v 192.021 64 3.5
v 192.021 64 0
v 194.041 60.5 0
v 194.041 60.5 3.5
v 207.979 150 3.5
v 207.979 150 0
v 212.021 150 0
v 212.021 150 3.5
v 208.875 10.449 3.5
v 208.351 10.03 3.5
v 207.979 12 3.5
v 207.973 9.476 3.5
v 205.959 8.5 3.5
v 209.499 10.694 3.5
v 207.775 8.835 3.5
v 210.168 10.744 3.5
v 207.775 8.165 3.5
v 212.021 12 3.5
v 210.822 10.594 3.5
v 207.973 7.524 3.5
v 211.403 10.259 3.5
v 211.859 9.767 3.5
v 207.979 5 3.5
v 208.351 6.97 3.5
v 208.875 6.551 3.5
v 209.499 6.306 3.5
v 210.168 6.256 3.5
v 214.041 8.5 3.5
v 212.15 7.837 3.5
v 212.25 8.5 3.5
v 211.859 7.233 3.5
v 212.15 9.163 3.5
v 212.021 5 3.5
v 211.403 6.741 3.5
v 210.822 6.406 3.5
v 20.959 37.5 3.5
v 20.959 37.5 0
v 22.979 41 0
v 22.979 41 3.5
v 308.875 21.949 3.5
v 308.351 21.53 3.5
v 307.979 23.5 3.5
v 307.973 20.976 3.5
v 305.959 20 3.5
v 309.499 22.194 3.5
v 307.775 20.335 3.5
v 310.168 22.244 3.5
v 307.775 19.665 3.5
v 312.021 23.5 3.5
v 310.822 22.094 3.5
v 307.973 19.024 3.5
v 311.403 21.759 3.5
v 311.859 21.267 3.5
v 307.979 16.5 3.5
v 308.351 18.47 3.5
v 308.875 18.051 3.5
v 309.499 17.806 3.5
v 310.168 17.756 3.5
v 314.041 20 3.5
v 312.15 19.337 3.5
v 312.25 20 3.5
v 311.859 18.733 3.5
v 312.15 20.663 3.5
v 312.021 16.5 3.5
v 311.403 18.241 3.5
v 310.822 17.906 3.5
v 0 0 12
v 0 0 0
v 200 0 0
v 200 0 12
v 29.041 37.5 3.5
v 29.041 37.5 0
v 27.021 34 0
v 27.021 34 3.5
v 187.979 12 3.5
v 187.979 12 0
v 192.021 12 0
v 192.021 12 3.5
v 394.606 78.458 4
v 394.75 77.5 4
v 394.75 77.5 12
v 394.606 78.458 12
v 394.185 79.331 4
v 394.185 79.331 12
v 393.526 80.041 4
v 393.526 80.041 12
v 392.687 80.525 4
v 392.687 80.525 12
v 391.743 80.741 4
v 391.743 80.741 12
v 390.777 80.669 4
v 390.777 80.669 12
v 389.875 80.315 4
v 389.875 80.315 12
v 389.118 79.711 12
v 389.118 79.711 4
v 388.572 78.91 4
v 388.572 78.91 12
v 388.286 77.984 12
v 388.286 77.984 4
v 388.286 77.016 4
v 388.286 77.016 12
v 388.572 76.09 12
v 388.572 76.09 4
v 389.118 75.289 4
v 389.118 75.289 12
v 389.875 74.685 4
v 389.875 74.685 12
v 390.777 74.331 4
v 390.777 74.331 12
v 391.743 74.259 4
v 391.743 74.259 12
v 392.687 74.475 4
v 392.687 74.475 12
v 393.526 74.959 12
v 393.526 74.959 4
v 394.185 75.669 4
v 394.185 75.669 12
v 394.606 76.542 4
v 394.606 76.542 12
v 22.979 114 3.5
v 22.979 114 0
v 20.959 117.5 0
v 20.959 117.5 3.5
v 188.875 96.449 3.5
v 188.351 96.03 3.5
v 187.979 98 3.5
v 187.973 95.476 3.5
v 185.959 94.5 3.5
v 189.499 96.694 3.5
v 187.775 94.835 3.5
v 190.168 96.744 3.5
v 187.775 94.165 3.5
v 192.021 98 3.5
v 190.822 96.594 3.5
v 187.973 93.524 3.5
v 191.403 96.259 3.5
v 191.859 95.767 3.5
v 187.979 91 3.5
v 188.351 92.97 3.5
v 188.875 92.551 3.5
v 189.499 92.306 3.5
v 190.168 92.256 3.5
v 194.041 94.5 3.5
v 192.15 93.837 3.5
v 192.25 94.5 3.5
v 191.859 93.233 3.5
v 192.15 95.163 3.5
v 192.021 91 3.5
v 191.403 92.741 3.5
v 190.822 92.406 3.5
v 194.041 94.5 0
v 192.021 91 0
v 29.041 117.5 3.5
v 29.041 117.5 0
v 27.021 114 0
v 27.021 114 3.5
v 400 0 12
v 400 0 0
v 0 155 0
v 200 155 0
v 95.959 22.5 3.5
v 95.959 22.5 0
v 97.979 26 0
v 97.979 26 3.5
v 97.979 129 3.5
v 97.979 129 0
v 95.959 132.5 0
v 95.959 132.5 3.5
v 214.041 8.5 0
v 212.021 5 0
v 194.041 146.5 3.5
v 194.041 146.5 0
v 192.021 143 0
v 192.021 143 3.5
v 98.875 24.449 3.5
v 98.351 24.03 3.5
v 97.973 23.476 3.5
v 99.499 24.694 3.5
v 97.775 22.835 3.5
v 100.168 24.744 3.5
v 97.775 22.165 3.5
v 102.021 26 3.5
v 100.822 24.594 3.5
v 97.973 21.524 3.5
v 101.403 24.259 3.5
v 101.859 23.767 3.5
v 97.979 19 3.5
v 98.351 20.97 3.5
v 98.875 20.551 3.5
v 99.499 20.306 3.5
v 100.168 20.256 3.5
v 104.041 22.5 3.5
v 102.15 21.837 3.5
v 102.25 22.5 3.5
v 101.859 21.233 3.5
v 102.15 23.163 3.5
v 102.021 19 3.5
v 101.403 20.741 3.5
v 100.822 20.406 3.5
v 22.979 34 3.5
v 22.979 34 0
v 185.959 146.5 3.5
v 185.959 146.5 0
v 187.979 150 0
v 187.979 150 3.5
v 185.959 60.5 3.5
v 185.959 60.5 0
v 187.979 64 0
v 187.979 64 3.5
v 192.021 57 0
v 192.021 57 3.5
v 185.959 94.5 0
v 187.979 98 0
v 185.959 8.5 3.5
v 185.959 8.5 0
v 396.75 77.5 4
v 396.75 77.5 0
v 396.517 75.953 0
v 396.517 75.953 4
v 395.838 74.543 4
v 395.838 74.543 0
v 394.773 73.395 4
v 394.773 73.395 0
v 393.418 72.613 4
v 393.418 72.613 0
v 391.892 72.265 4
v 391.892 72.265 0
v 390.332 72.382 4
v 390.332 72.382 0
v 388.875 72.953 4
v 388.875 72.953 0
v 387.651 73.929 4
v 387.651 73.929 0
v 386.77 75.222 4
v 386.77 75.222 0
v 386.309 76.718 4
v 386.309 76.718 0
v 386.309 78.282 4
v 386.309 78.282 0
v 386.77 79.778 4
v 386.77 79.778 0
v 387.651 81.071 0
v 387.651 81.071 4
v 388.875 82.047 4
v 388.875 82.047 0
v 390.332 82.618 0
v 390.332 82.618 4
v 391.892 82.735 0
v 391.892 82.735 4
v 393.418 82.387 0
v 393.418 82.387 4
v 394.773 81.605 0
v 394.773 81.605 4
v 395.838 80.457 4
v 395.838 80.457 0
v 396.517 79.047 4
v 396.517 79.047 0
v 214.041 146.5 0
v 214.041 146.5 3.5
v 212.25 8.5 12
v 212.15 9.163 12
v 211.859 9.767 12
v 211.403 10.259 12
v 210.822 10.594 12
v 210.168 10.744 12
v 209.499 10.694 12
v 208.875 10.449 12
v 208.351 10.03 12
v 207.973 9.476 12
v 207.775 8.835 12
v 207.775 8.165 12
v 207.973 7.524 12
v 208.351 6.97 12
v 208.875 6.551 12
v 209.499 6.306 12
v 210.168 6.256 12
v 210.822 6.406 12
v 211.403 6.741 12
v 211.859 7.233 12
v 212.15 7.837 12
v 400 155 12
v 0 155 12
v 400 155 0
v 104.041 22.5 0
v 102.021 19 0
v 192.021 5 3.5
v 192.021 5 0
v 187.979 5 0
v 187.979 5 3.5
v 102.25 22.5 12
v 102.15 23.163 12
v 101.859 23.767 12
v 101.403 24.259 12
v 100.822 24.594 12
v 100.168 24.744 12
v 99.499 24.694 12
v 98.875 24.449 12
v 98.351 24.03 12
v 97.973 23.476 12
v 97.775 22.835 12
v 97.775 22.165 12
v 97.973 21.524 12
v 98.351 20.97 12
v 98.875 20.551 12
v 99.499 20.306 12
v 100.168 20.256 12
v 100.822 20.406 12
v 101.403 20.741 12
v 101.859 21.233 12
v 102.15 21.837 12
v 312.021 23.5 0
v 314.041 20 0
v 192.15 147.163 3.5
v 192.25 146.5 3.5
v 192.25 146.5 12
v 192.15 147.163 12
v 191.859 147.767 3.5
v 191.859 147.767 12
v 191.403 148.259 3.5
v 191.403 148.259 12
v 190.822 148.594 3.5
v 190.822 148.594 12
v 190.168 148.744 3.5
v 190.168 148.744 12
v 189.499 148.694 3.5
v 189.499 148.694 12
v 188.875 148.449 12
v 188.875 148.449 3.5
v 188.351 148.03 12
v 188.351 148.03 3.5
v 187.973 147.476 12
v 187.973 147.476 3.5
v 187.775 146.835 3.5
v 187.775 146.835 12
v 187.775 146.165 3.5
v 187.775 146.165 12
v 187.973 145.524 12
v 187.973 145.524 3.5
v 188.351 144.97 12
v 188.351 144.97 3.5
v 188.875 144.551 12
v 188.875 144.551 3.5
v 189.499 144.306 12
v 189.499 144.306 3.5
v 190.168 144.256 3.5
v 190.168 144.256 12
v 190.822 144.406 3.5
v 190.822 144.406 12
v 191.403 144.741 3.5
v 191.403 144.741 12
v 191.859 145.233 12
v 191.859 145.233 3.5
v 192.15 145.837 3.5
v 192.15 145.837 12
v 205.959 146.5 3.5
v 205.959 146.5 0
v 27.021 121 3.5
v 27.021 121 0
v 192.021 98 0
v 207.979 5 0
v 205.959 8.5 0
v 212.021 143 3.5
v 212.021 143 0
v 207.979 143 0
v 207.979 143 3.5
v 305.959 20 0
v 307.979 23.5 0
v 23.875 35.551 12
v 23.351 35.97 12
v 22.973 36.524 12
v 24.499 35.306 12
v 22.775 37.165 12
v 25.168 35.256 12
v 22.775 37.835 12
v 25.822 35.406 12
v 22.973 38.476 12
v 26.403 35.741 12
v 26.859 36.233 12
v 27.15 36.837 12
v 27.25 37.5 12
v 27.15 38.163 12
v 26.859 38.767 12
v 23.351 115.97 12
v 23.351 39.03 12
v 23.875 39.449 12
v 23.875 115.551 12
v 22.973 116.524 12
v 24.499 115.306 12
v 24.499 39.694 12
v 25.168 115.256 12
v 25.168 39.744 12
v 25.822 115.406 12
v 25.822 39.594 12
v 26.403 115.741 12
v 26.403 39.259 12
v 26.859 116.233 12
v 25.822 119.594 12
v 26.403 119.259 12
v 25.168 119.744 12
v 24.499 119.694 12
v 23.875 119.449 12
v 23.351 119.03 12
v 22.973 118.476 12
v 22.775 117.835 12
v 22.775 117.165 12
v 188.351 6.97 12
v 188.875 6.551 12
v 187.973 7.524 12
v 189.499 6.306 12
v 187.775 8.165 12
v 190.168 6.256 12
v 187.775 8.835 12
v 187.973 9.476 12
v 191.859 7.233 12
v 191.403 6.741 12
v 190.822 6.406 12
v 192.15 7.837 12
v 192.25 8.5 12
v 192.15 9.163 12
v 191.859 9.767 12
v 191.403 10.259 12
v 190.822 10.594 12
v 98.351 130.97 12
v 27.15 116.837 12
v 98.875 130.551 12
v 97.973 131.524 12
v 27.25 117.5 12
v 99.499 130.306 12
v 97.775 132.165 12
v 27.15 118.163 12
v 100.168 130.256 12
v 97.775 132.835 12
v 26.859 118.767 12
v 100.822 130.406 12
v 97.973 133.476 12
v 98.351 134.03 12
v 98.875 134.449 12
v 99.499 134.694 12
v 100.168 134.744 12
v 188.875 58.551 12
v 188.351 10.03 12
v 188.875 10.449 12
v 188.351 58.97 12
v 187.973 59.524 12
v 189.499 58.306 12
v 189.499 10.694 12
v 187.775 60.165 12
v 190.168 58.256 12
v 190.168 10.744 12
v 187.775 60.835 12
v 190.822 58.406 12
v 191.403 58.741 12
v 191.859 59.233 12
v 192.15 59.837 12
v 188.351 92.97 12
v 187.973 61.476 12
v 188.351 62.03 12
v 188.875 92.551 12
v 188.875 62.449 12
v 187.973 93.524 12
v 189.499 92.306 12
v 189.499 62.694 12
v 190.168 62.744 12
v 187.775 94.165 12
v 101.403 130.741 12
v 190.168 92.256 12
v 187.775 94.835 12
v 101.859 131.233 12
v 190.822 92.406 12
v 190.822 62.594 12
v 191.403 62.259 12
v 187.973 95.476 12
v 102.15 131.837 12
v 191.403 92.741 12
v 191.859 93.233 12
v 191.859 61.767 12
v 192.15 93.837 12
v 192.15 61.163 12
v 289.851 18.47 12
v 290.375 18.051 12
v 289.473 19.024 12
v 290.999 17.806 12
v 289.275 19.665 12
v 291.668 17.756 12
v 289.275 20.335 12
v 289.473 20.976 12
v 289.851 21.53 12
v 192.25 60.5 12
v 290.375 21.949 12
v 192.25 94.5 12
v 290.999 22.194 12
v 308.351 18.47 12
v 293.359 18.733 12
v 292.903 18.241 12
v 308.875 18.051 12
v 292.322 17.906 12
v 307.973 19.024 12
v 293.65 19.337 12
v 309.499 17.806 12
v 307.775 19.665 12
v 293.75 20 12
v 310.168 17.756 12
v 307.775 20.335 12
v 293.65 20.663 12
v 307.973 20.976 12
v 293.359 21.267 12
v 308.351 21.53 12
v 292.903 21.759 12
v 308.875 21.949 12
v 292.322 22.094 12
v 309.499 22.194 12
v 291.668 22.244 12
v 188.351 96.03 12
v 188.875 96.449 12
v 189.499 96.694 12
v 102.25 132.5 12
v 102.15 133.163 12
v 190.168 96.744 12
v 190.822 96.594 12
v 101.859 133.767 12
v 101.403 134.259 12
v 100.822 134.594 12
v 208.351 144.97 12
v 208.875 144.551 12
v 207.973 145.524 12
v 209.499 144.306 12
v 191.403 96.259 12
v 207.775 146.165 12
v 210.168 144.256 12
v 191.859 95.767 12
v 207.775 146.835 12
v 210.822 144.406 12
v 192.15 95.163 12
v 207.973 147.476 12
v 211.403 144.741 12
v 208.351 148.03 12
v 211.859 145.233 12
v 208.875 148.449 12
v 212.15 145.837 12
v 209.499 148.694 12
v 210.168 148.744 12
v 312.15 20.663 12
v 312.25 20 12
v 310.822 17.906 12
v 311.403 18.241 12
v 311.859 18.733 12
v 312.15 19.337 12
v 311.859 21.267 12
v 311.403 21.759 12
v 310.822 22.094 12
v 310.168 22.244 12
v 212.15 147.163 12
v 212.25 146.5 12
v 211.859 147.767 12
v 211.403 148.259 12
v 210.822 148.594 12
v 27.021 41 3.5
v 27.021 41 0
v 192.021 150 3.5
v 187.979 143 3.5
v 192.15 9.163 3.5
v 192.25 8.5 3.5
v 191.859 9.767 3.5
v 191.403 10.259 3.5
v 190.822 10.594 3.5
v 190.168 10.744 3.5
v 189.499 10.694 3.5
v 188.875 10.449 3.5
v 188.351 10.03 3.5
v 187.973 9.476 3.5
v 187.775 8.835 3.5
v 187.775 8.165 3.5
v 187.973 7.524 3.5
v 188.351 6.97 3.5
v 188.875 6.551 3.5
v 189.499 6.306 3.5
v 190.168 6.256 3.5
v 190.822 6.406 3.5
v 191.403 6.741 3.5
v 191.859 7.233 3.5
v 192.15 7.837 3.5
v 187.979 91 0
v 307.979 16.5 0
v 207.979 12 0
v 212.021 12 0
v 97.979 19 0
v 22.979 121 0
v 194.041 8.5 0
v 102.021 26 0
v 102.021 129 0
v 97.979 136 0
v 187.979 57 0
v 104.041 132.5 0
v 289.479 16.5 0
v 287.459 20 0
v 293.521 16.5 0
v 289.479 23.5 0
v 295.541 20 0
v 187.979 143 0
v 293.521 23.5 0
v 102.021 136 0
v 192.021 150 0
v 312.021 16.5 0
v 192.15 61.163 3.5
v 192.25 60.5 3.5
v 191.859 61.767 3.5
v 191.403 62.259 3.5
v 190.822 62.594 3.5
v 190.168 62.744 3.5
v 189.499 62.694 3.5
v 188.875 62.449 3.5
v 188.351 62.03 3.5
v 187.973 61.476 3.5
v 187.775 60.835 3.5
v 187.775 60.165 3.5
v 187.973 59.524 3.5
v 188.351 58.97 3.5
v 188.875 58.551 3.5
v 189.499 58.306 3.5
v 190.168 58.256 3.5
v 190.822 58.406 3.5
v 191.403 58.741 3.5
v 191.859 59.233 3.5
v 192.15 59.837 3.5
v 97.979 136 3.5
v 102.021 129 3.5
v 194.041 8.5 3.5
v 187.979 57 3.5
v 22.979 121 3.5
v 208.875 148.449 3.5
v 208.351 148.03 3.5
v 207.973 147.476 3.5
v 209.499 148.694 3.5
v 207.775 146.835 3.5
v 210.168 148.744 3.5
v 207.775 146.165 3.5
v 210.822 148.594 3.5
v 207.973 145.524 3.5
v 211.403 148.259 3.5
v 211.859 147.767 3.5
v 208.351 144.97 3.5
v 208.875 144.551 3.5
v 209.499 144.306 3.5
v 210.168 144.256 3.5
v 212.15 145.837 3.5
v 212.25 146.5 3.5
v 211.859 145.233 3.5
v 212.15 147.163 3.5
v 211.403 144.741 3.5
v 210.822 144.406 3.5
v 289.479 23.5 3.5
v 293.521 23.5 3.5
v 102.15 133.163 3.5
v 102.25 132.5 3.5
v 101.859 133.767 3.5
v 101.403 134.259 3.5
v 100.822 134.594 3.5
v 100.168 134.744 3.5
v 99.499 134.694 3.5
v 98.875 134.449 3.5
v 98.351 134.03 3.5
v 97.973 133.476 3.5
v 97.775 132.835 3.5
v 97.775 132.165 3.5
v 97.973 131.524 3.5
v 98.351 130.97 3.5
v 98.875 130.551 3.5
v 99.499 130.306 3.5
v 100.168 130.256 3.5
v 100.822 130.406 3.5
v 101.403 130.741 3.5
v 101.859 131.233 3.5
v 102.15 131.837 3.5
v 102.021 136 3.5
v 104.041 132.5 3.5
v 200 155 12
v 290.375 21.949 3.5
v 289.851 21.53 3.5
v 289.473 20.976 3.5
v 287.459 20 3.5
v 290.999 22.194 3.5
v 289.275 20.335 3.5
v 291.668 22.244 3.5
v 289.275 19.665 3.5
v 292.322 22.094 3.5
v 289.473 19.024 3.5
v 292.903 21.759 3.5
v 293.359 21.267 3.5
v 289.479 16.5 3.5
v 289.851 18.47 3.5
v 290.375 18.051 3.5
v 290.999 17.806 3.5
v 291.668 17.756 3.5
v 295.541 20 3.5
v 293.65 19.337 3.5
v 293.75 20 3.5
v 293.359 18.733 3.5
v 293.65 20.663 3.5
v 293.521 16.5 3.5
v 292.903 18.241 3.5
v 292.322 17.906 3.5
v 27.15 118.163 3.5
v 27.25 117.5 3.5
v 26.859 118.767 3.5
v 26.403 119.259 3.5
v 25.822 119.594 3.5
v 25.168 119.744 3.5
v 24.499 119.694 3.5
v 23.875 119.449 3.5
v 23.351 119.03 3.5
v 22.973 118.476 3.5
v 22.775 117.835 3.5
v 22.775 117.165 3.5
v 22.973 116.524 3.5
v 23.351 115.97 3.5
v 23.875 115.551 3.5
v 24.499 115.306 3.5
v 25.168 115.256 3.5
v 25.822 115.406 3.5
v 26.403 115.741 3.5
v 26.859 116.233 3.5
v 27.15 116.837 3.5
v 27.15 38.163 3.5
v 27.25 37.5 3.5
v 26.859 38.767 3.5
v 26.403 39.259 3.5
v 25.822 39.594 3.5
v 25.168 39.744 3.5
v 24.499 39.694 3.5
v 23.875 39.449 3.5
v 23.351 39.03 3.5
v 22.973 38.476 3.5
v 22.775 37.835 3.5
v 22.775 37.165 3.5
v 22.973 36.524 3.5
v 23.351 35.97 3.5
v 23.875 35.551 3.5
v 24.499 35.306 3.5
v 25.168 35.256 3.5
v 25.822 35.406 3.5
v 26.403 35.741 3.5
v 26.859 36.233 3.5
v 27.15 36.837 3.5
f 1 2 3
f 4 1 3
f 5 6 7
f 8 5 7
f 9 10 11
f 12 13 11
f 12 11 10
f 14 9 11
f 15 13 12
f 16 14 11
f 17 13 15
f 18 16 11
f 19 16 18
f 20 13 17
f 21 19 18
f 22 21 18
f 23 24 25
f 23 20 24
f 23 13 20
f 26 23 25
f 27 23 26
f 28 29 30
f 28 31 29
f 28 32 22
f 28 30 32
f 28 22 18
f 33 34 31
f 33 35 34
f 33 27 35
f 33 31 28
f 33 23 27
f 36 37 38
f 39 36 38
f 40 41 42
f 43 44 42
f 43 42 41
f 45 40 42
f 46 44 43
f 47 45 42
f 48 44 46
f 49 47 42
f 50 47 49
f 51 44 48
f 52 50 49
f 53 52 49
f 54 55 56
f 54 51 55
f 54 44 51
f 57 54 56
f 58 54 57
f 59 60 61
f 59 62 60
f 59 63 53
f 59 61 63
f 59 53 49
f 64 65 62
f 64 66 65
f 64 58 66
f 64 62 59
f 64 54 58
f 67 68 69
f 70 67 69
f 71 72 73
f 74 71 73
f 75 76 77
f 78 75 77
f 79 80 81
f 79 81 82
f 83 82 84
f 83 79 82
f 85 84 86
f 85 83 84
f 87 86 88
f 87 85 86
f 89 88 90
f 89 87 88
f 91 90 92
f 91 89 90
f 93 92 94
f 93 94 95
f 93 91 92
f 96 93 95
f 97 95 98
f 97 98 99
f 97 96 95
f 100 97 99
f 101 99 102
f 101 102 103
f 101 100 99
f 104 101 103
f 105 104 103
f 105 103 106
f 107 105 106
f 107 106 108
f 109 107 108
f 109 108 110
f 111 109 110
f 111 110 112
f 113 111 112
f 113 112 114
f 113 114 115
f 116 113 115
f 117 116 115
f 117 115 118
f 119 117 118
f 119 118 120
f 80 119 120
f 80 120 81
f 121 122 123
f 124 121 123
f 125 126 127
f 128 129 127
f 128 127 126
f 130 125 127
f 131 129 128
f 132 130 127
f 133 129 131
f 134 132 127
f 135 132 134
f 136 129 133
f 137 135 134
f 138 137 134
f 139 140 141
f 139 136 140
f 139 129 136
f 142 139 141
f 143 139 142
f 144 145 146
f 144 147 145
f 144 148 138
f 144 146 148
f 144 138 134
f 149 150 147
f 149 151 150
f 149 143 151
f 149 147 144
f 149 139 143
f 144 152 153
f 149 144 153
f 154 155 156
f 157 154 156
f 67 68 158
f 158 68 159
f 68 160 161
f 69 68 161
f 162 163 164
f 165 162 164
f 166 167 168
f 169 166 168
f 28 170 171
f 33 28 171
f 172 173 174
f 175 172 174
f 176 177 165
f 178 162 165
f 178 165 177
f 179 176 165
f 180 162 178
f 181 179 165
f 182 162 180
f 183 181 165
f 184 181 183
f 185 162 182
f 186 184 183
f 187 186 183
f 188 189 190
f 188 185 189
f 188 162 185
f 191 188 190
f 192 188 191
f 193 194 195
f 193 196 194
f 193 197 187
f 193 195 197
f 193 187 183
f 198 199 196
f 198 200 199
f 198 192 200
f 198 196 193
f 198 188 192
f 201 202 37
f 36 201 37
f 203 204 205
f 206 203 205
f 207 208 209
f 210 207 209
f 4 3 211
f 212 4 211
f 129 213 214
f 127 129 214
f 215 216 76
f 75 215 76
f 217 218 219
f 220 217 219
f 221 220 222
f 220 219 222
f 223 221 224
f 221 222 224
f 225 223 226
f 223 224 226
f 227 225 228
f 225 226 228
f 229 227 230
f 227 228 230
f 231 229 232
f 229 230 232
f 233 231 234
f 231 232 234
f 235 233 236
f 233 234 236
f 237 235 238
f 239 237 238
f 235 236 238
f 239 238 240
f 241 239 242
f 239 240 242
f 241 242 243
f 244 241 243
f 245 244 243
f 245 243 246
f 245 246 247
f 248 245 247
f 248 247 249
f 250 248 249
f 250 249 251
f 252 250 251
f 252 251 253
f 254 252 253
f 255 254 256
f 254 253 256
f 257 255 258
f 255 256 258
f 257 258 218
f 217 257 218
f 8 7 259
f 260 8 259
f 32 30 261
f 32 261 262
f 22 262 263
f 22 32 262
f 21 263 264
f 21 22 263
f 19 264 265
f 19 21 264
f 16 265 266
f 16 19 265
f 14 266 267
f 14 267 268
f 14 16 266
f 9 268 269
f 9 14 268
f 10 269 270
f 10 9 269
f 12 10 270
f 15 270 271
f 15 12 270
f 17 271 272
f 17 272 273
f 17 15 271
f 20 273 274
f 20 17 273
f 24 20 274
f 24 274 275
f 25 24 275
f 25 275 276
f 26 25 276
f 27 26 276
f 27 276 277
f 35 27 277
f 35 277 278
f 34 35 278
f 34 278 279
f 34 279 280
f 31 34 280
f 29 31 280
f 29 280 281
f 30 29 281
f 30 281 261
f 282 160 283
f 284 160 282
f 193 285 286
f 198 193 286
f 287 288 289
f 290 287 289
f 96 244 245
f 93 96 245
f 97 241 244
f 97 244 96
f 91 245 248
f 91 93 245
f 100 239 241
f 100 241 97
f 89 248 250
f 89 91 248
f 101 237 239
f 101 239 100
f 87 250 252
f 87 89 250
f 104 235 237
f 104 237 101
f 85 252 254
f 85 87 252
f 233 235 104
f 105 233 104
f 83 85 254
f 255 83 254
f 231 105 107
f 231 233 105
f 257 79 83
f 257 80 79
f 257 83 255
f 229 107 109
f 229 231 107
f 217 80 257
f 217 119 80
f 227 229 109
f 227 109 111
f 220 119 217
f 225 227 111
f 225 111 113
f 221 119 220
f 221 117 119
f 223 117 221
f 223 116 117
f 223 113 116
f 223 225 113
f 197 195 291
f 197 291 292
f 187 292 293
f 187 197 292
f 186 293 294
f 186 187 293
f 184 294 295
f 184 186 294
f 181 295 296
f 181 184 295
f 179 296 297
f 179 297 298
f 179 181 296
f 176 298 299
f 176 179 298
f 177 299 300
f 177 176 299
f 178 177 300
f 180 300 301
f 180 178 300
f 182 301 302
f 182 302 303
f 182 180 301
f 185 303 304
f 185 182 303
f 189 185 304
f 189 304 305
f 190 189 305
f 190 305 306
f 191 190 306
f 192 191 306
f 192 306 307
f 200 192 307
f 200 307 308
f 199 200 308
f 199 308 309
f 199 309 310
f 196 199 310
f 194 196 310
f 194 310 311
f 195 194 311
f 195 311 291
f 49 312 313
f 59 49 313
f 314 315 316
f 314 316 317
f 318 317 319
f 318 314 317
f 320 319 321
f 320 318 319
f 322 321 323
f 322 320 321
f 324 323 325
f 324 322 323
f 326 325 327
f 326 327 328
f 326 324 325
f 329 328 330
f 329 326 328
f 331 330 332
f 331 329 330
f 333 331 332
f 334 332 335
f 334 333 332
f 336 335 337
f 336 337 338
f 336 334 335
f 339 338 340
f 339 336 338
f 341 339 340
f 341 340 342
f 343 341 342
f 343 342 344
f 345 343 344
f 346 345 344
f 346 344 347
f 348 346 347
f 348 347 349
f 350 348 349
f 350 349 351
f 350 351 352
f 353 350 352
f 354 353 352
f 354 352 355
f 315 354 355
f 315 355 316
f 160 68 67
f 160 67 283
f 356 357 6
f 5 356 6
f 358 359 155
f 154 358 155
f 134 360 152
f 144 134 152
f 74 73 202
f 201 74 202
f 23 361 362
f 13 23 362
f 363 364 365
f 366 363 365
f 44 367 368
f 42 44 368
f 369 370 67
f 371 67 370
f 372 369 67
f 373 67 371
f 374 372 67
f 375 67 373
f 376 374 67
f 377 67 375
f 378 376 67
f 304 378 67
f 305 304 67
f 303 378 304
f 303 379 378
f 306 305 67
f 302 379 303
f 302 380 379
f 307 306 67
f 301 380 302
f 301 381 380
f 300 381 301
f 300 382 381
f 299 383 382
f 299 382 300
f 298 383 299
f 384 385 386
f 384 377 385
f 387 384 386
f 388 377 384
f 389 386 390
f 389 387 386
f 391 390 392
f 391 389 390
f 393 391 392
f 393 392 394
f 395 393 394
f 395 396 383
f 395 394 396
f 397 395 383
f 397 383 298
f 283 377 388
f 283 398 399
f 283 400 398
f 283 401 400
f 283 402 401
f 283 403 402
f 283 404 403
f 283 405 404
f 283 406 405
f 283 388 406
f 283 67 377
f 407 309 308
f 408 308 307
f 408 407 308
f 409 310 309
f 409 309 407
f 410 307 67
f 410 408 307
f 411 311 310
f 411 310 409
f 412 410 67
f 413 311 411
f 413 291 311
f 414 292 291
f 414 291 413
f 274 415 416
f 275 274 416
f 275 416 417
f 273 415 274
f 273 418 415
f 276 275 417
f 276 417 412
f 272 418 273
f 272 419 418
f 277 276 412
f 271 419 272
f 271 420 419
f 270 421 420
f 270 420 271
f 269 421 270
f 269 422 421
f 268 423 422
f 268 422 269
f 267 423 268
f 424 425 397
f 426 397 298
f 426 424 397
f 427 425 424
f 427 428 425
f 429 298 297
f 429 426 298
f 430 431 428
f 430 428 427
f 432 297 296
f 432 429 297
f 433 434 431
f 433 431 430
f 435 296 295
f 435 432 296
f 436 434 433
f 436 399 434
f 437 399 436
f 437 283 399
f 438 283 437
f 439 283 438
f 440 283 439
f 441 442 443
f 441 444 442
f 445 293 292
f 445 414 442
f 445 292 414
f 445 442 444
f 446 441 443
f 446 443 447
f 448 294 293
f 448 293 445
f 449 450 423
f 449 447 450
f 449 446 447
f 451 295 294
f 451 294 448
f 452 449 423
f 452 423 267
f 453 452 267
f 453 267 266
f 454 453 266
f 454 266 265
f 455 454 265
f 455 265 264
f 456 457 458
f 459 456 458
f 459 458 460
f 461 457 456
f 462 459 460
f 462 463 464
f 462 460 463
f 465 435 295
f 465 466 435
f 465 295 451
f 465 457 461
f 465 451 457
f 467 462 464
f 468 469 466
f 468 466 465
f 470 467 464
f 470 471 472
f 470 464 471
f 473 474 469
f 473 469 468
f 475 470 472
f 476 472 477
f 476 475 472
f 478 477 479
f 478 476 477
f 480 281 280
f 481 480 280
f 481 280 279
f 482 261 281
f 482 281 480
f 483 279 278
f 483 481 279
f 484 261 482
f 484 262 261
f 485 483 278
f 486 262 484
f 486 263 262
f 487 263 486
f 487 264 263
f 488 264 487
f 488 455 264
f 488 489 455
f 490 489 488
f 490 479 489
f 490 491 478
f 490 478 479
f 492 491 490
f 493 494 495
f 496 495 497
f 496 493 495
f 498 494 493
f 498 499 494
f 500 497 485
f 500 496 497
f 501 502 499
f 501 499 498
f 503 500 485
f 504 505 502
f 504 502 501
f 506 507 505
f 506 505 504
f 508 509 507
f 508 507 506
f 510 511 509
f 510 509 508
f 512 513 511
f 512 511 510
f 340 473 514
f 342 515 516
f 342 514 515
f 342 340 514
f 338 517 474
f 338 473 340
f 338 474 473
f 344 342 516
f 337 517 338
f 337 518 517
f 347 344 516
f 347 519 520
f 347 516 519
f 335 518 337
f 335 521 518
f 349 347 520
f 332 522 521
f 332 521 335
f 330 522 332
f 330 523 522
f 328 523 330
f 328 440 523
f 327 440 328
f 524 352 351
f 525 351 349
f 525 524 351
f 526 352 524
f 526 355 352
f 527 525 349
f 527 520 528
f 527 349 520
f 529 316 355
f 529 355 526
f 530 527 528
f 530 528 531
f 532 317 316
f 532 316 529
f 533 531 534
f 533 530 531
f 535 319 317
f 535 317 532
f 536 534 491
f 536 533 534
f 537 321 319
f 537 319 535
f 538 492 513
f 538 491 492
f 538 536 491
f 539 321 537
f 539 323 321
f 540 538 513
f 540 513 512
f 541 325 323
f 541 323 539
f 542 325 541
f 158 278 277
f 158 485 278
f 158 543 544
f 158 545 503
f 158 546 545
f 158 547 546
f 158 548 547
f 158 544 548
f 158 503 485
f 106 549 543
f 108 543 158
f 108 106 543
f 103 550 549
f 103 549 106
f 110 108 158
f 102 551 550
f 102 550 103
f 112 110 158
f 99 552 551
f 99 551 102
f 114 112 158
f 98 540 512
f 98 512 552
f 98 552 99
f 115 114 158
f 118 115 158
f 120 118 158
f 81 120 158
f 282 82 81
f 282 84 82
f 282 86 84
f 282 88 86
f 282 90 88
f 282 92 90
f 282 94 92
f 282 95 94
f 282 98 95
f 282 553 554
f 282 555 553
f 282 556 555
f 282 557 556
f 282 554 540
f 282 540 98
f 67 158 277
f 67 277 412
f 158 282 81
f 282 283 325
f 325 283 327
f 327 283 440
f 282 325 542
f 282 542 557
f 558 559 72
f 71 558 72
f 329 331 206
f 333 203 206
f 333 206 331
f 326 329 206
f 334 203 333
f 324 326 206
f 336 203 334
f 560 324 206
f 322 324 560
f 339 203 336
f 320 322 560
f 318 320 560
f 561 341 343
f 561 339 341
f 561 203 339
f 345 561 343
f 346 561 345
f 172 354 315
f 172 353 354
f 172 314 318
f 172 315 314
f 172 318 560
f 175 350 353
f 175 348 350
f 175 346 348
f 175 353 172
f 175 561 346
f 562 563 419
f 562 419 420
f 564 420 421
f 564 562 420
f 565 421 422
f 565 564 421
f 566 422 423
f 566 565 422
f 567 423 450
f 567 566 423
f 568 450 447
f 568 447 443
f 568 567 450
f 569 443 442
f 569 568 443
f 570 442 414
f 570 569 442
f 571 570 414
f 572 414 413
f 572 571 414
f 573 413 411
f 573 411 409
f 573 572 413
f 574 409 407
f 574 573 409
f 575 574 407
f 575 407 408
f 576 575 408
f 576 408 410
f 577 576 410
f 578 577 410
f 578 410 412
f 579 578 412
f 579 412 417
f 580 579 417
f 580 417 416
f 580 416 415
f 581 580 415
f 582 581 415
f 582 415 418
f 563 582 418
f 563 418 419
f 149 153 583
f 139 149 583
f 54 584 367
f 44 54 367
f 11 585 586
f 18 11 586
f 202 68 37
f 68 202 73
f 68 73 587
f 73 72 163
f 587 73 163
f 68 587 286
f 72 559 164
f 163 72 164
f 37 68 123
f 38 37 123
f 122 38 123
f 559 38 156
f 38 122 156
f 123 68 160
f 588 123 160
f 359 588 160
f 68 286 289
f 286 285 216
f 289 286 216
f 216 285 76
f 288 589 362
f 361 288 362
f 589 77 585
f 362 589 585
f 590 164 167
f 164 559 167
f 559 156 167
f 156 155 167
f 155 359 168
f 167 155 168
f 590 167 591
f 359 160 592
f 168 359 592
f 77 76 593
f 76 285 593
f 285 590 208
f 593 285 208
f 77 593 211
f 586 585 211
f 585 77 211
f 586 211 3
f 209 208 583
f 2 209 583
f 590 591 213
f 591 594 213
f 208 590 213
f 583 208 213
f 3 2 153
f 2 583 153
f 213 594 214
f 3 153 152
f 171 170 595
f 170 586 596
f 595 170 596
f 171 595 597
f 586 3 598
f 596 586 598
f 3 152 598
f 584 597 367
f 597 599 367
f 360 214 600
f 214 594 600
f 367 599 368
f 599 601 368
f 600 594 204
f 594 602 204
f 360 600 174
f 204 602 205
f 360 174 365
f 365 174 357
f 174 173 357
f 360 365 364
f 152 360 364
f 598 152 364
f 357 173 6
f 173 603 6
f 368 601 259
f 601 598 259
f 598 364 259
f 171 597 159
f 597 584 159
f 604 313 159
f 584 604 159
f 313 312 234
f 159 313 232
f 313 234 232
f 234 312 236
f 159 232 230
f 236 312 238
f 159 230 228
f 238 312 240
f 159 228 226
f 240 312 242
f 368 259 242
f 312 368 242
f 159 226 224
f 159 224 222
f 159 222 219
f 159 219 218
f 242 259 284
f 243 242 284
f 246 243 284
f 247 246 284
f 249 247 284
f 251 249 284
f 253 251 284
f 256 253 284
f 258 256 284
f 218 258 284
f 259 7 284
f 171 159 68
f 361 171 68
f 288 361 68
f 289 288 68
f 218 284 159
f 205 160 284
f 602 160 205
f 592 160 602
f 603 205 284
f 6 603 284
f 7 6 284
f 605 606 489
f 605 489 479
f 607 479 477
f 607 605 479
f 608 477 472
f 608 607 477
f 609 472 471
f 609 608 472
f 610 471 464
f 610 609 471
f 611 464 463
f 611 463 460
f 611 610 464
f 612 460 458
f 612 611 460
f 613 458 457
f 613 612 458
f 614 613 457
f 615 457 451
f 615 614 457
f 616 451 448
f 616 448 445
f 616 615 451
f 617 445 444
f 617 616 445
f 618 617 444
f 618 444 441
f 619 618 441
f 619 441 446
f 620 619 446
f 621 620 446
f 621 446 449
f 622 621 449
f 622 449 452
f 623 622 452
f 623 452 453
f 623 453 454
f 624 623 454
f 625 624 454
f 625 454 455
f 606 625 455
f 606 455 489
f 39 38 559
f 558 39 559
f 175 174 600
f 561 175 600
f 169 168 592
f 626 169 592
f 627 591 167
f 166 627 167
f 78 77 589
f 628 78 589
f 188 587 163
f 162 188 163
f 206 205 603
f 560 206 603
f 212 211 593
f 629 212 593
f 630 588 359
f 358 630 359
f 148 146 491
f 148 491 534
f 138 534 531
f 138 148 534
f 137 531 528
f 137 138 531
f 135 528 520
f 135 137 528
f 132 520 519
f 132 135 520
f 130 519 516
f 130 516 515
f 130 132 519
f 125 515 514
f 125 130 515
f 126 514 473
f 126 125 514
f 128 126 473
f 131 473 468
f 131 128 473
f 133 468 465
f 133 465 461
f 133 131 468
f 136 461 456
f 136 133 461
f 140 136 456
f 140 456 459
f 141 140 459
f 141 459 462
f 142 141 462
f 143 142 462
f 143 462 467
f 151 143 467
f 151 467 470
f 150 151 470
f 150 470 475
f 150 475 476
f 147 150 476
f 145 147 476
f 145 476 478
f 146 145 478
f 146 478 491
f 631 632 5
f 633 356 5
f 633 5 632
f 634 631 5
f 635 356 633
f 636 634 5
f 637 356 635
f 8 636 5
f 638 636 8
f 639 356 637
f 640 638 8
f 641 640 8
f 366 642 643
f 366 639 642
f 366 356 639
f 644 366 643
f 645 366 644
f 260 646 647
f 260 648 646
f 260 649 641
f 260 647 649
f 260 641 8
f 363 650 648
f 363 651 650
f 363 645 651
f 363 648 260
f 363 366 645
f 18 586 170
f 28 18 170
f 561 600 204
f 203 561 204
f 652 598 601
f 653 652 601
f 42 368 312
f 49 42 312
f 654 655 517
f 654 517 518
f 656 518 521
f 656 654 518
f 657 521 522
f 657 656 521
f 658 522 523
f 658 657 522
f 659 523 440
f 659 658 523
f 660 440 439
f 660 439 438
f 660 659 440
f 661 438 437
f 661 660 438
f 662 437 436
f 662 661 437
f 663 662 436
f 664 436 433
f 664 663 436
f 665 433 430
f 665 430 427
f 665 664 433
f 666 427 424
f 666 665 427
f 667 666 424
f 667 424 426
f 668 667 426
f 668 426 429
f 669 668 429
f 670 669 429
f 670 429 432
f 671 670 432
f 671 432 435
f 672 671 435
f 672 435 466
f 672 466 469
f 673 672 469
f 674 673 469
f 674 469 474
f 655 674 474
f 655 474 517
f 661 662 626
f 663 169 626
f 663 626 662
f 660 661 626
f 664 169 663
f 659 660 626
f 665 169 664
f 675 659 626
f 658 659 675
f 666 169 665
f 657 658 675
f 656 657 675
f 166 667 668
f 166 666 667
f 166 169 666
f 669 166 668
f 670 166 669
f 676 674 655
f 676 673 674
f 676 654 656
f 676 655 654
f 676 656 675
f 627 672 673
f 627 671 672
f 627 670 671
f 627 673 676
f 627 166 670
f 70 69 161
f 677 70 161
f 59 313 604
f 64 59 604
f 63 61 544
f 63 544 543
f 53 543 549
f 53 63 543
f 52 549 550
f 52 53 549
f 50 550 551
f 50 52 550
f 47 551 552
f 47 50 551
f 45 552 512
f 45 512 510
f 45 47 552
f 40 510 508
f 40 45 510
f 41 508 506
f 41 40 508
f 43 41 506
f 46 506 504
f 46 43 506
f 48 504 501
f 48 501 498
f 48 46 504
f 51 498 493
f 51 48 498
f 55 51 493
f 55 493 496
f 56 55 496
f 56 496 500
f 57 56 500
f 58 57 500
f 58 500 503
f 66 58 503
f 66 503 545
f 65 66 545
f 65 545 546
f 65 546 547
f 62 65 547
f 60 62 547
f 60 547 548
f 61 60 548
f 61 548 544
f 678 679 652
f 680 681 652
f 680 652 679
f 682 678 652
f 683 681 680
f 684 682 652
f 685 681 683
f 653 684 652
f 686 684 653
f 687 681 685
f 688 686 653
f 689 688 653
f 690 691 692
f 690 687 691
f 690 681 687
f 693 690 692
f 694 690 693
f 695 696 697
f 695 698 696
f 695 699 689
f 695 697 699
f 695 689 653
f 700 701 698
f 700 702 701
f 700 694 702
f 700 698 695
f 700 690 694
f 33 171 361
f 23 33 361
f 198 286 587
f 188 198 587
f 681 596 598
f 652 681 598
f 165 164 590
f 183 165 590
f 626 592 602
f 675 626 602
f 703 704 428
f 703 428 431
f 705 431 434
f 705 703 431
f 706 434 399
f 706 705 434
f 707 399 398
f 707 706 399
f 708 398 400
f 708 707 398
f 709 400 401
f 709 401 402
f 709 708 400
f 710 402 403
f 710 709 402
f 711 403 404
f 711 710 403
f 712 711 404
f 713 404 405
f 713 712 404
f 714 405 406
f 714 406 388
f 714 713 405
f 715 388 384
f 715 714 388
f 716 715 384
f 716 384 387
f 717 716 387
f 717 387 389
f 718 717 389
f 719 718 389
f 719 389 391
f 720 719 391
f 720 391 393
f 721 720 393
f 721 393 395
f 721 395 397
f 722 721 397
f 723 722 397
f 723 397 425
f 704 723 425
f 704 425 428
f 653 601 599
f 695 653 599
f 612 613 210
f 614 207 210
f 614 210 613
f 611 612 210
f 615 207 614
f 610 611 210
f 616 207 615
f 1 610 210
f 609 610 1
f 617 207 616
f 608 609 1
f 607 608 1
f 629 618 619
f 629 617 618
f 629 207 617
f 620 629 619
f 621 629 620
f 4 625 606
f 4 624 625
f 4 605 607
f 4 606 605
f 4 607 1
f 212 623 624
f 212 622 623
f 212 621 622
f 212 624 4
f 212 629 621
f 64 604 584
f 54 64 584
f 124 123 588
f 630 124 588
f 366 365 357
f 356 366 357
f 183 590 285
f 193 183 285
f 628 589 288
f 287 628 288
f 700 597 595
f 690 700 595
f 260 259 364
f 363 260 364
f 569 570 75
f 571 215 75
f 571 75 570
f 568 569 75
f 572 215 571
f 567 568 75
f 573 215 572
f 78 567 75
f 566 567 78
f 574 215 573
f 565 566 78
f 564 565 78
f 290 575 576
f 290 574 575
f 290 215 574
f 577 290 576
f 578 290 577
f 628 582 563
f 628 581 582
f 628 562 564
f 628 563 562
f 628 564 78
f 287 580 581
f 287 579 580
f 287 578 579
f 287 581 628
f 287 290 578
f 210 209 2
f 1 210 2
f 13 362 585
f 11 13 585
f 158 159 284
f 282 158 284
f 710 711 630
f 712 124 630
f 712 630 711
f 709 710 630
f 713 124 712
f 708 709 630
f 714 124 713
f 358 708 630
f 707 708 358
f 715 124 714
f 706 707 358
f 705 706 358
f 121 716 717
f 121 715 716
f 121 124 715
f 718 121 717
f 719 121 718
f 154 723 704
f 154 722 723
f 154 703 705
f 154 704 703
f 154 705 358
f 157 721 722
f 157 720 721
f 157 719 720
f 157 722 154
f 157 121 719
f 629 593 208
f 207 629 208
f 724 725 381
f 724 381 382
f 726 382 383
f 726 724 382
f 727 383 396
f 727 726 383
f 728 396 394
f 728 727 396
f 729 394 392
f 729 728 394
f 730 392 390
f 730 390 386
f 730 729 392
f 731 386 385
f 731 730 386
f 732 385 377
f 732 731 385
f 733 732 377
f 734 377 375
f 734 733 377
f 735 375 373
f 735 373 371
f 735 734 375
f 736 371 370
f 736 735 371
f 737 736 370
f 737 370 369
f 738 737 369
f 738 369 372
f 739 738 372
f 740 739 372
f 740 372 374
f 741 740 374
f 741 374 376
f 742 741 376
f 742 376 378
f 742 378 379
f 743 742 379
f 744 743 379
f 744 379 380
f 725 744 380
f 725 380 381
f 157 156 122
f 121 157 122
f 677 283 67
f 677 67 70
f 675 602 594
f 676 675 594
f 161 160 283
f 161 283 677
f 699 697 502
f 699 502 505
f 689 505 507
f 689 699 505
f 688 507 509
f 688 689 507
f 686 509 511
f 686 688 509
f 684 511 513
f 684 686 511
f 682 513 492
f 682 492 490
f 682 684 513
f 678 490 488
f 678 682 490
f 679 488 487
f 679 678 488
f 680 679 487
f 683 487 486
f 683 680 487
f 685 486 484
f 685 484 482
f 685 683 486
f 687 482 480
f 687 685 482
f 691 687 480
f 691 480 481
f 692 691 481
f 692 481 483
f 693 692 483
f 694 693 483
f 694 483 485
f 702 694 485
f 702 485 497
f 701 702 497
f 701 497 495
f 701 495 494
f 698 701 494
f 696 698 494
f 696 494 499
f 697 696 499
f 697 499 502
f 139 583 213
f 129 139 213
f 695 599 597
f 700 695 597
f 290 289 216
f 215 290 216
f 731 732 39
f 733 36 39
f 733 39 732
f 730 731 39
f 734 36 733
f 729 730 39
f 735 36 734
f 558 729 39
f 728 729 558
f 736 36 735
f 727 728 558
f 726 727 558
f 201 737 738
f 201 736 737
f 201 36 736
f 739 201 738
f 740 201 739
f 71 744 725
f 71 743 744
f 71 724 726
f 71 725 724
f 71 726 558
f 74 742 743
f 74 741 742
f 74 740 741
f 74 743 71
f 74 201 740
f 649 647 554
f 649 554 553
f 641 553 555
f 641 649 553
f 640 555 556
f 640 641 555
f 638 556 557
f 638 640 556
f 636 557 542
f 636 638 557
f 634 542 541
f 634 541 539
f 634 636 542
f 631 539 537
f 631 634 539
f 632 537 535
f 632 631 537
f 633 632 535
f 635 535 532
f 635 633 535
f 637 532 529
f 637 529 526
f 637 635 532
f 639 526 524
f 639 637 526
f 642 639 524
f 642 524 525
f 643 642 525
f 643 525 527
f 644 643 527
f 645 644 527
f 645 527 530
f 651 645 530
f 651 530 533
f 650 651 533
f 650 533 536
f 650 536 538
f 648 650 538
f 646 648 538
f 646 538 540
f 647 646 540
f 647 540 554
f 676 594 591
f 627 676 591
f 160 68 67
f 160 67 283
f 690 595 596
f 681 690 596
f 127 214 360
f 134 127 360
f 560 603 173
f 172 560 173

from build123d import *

# Parameters (mm, degrees)
SKETCH_W        = 400
SKETCH_H        = 155
SKETCH_R        = 2.25
SKETCH_R_2      = 3.25
PAD_DEPTH       = 12
POCKET_DEPTH    = 3.5
SKETCH002_R     = 5.25
POCKET001_DEPTH = 4
BOX_W           = 200
BOX_H           = 155
BOX_DEPTH       = 12


with BuildPart() as body:
    # Sketch → Pad (new body)
    with BuildSketch(Plane.XY):
        with Locations((200, 77.5)):
            Rectangle(SKETCH_W, SKETCH_H)
        with Locations((190, 8.5)):
            Circle(SKETCH_R, mode=Mode.SUBTRACT)
        with Locations((190, 146.5)):
            Circle(SKETCH_R, mode=Mode.SUBTRACT)
        with Locations((210, 8.5)):
            Circle(SKETCH_R, mode=Mode.SUBTRACT)
        with Locations((210, 146.5)):
            Circle(SKETCH_R, mode=Mode.SUBTRACT)
        with Locations((391.5, 77.5)):
            Circle(SKETCH_R_2, mode=Mode.SUBTRACT)
        with Locations((25, 37.5)):
            Circle(SKETCH_R, mode=Mode.SUBTRACT)
        with Locations((25, 117.5)):
            Circle(SKETCH_R, mode=Mode.SUBTRACT)
        with Locations((100, 22.5)):
            Circle(SKETCH_R, mode=Mode.SUBTRACT)
        with Locations((100, 132.5)):
            Circle(SKETCH_R, mode=Mode.SUBTRACT)
        with Locations((190, 60.5)):
            Circle(SKETCH_R, mode=Mode.SUBTRACT)
        with Locations((190, 94.5)):
            Circle(SKETCH_R, mode=Mode.SUBTRACT)
        with Locations((291.5, 20)):
            Circle(SKETCH_R, mode=Mode.SUBTRACT)
        with Locations((310, 20)):
            Circle(SKETCH_R, mode=Mode.SUBTRACT)
    extrude(amount=PAD_DEPTH)

    # Sketch001 (on Face18 of Pad) → Pocket (cut)
    with BuildSketch(Plane(origin=(0, 0, 0), x_dir=(1, 0, 0), z_dir=(0, 0, -1))):
        Polygon((29.041452, -37.5), (27.020726, -34), (22.979274, -34), (20.958548, -37.5), (22.979274, -41), (27.020726, -41), align=None)
        Polygon((102.020726, -26), (104.041452, -22.5), (102.020726, -19), (97.979274, -19), (95.958548, -22.5), (97.979274, -26), align=None)
        Polygon((194.041452, -60.5), (192.020726, -57), (187.979274, -57), (185.958548, -60.5), (187.979274, -64), (192.020726, -64), align=None)
        Polygon((27.020726, -114), (22.979274, -114), (20.958548, -117.5), (22.979274, -121), (27.020726, -121), (29.041452, -117.5), align=None)
        Polygon((192.020726, -5), (187.979274, -5), (185.958548, -8.5), (187.979274, -12), (192.020726, -12), (194.041452, -8.5), align=None)
        Polygon((102.020726, -129), (97.979274, -129), (95.958548, -132.5), (97.979274, -136), (102.020726, -136), (104.041452, -132.5), align=None)
        Polygon((192.020726, -91), (187.979274, -91), (185.958548, -94.5), (187.979274, -98), (192.020726, -98), (194.041452, -94.5), align=None)
        Polygon((192.020726, -143), (187.979274, -143), (185.958548, -146.5), (187.979274, -150), (192.020726, -150), (194.041452, -146.5), align=None)
        Polygon((212.020726, -12), (214.041452, -8.5), (212.020726, -5), (207.979274, -5), (205.958548, -8.5), (207.979274, -12), align=None)
        Polygon((212.020726, -143), (207.979274, -143), (205.958548, -146.5), (207.979274, -150), (212.020726, -150), (214.041452, -146.5), align=None)
        Polygon((295.541452, -20), (293.520726, -16.5), (289.479274, -16.5), (287.458548, -20), (289.479274, -23.5), (293.520726, -23.5), align=None)
        Polygon((312.020726, -16.5), (307.979274, -16.5), (305.958548, -20), (307.979274, -23.5), (312.020726, -23.5), (314.041452, -20), align=None)
    extrude(amount=-POCKET_DEPTH, mode=Mode.SUBTRACT)

    # Sketch002 (on Face4 of Pocket) → Pocket001 (cut)
    with BuildSketch(Plane(origin=(0, 0, 0), x_dir=(1, 0, 0), z_dir=(0, 0, -1))):
        with Locations((391.5, -77.5)):
            Circle(SKETCH002_R)
    extrude(amount=-POCKET001_DEPTH, mode=Mode.SUBTRACT)


with BuildPart() as cube:
    # Box → Box (new body)
    with BuildSketch(Plane.XY):
        with Locations((100, 77.5)):
            Rectangle(BOX_W, BOX_H)
    extrude(amount=BOX_DEPTH)


solid = Compound([body.part, cube.part])
